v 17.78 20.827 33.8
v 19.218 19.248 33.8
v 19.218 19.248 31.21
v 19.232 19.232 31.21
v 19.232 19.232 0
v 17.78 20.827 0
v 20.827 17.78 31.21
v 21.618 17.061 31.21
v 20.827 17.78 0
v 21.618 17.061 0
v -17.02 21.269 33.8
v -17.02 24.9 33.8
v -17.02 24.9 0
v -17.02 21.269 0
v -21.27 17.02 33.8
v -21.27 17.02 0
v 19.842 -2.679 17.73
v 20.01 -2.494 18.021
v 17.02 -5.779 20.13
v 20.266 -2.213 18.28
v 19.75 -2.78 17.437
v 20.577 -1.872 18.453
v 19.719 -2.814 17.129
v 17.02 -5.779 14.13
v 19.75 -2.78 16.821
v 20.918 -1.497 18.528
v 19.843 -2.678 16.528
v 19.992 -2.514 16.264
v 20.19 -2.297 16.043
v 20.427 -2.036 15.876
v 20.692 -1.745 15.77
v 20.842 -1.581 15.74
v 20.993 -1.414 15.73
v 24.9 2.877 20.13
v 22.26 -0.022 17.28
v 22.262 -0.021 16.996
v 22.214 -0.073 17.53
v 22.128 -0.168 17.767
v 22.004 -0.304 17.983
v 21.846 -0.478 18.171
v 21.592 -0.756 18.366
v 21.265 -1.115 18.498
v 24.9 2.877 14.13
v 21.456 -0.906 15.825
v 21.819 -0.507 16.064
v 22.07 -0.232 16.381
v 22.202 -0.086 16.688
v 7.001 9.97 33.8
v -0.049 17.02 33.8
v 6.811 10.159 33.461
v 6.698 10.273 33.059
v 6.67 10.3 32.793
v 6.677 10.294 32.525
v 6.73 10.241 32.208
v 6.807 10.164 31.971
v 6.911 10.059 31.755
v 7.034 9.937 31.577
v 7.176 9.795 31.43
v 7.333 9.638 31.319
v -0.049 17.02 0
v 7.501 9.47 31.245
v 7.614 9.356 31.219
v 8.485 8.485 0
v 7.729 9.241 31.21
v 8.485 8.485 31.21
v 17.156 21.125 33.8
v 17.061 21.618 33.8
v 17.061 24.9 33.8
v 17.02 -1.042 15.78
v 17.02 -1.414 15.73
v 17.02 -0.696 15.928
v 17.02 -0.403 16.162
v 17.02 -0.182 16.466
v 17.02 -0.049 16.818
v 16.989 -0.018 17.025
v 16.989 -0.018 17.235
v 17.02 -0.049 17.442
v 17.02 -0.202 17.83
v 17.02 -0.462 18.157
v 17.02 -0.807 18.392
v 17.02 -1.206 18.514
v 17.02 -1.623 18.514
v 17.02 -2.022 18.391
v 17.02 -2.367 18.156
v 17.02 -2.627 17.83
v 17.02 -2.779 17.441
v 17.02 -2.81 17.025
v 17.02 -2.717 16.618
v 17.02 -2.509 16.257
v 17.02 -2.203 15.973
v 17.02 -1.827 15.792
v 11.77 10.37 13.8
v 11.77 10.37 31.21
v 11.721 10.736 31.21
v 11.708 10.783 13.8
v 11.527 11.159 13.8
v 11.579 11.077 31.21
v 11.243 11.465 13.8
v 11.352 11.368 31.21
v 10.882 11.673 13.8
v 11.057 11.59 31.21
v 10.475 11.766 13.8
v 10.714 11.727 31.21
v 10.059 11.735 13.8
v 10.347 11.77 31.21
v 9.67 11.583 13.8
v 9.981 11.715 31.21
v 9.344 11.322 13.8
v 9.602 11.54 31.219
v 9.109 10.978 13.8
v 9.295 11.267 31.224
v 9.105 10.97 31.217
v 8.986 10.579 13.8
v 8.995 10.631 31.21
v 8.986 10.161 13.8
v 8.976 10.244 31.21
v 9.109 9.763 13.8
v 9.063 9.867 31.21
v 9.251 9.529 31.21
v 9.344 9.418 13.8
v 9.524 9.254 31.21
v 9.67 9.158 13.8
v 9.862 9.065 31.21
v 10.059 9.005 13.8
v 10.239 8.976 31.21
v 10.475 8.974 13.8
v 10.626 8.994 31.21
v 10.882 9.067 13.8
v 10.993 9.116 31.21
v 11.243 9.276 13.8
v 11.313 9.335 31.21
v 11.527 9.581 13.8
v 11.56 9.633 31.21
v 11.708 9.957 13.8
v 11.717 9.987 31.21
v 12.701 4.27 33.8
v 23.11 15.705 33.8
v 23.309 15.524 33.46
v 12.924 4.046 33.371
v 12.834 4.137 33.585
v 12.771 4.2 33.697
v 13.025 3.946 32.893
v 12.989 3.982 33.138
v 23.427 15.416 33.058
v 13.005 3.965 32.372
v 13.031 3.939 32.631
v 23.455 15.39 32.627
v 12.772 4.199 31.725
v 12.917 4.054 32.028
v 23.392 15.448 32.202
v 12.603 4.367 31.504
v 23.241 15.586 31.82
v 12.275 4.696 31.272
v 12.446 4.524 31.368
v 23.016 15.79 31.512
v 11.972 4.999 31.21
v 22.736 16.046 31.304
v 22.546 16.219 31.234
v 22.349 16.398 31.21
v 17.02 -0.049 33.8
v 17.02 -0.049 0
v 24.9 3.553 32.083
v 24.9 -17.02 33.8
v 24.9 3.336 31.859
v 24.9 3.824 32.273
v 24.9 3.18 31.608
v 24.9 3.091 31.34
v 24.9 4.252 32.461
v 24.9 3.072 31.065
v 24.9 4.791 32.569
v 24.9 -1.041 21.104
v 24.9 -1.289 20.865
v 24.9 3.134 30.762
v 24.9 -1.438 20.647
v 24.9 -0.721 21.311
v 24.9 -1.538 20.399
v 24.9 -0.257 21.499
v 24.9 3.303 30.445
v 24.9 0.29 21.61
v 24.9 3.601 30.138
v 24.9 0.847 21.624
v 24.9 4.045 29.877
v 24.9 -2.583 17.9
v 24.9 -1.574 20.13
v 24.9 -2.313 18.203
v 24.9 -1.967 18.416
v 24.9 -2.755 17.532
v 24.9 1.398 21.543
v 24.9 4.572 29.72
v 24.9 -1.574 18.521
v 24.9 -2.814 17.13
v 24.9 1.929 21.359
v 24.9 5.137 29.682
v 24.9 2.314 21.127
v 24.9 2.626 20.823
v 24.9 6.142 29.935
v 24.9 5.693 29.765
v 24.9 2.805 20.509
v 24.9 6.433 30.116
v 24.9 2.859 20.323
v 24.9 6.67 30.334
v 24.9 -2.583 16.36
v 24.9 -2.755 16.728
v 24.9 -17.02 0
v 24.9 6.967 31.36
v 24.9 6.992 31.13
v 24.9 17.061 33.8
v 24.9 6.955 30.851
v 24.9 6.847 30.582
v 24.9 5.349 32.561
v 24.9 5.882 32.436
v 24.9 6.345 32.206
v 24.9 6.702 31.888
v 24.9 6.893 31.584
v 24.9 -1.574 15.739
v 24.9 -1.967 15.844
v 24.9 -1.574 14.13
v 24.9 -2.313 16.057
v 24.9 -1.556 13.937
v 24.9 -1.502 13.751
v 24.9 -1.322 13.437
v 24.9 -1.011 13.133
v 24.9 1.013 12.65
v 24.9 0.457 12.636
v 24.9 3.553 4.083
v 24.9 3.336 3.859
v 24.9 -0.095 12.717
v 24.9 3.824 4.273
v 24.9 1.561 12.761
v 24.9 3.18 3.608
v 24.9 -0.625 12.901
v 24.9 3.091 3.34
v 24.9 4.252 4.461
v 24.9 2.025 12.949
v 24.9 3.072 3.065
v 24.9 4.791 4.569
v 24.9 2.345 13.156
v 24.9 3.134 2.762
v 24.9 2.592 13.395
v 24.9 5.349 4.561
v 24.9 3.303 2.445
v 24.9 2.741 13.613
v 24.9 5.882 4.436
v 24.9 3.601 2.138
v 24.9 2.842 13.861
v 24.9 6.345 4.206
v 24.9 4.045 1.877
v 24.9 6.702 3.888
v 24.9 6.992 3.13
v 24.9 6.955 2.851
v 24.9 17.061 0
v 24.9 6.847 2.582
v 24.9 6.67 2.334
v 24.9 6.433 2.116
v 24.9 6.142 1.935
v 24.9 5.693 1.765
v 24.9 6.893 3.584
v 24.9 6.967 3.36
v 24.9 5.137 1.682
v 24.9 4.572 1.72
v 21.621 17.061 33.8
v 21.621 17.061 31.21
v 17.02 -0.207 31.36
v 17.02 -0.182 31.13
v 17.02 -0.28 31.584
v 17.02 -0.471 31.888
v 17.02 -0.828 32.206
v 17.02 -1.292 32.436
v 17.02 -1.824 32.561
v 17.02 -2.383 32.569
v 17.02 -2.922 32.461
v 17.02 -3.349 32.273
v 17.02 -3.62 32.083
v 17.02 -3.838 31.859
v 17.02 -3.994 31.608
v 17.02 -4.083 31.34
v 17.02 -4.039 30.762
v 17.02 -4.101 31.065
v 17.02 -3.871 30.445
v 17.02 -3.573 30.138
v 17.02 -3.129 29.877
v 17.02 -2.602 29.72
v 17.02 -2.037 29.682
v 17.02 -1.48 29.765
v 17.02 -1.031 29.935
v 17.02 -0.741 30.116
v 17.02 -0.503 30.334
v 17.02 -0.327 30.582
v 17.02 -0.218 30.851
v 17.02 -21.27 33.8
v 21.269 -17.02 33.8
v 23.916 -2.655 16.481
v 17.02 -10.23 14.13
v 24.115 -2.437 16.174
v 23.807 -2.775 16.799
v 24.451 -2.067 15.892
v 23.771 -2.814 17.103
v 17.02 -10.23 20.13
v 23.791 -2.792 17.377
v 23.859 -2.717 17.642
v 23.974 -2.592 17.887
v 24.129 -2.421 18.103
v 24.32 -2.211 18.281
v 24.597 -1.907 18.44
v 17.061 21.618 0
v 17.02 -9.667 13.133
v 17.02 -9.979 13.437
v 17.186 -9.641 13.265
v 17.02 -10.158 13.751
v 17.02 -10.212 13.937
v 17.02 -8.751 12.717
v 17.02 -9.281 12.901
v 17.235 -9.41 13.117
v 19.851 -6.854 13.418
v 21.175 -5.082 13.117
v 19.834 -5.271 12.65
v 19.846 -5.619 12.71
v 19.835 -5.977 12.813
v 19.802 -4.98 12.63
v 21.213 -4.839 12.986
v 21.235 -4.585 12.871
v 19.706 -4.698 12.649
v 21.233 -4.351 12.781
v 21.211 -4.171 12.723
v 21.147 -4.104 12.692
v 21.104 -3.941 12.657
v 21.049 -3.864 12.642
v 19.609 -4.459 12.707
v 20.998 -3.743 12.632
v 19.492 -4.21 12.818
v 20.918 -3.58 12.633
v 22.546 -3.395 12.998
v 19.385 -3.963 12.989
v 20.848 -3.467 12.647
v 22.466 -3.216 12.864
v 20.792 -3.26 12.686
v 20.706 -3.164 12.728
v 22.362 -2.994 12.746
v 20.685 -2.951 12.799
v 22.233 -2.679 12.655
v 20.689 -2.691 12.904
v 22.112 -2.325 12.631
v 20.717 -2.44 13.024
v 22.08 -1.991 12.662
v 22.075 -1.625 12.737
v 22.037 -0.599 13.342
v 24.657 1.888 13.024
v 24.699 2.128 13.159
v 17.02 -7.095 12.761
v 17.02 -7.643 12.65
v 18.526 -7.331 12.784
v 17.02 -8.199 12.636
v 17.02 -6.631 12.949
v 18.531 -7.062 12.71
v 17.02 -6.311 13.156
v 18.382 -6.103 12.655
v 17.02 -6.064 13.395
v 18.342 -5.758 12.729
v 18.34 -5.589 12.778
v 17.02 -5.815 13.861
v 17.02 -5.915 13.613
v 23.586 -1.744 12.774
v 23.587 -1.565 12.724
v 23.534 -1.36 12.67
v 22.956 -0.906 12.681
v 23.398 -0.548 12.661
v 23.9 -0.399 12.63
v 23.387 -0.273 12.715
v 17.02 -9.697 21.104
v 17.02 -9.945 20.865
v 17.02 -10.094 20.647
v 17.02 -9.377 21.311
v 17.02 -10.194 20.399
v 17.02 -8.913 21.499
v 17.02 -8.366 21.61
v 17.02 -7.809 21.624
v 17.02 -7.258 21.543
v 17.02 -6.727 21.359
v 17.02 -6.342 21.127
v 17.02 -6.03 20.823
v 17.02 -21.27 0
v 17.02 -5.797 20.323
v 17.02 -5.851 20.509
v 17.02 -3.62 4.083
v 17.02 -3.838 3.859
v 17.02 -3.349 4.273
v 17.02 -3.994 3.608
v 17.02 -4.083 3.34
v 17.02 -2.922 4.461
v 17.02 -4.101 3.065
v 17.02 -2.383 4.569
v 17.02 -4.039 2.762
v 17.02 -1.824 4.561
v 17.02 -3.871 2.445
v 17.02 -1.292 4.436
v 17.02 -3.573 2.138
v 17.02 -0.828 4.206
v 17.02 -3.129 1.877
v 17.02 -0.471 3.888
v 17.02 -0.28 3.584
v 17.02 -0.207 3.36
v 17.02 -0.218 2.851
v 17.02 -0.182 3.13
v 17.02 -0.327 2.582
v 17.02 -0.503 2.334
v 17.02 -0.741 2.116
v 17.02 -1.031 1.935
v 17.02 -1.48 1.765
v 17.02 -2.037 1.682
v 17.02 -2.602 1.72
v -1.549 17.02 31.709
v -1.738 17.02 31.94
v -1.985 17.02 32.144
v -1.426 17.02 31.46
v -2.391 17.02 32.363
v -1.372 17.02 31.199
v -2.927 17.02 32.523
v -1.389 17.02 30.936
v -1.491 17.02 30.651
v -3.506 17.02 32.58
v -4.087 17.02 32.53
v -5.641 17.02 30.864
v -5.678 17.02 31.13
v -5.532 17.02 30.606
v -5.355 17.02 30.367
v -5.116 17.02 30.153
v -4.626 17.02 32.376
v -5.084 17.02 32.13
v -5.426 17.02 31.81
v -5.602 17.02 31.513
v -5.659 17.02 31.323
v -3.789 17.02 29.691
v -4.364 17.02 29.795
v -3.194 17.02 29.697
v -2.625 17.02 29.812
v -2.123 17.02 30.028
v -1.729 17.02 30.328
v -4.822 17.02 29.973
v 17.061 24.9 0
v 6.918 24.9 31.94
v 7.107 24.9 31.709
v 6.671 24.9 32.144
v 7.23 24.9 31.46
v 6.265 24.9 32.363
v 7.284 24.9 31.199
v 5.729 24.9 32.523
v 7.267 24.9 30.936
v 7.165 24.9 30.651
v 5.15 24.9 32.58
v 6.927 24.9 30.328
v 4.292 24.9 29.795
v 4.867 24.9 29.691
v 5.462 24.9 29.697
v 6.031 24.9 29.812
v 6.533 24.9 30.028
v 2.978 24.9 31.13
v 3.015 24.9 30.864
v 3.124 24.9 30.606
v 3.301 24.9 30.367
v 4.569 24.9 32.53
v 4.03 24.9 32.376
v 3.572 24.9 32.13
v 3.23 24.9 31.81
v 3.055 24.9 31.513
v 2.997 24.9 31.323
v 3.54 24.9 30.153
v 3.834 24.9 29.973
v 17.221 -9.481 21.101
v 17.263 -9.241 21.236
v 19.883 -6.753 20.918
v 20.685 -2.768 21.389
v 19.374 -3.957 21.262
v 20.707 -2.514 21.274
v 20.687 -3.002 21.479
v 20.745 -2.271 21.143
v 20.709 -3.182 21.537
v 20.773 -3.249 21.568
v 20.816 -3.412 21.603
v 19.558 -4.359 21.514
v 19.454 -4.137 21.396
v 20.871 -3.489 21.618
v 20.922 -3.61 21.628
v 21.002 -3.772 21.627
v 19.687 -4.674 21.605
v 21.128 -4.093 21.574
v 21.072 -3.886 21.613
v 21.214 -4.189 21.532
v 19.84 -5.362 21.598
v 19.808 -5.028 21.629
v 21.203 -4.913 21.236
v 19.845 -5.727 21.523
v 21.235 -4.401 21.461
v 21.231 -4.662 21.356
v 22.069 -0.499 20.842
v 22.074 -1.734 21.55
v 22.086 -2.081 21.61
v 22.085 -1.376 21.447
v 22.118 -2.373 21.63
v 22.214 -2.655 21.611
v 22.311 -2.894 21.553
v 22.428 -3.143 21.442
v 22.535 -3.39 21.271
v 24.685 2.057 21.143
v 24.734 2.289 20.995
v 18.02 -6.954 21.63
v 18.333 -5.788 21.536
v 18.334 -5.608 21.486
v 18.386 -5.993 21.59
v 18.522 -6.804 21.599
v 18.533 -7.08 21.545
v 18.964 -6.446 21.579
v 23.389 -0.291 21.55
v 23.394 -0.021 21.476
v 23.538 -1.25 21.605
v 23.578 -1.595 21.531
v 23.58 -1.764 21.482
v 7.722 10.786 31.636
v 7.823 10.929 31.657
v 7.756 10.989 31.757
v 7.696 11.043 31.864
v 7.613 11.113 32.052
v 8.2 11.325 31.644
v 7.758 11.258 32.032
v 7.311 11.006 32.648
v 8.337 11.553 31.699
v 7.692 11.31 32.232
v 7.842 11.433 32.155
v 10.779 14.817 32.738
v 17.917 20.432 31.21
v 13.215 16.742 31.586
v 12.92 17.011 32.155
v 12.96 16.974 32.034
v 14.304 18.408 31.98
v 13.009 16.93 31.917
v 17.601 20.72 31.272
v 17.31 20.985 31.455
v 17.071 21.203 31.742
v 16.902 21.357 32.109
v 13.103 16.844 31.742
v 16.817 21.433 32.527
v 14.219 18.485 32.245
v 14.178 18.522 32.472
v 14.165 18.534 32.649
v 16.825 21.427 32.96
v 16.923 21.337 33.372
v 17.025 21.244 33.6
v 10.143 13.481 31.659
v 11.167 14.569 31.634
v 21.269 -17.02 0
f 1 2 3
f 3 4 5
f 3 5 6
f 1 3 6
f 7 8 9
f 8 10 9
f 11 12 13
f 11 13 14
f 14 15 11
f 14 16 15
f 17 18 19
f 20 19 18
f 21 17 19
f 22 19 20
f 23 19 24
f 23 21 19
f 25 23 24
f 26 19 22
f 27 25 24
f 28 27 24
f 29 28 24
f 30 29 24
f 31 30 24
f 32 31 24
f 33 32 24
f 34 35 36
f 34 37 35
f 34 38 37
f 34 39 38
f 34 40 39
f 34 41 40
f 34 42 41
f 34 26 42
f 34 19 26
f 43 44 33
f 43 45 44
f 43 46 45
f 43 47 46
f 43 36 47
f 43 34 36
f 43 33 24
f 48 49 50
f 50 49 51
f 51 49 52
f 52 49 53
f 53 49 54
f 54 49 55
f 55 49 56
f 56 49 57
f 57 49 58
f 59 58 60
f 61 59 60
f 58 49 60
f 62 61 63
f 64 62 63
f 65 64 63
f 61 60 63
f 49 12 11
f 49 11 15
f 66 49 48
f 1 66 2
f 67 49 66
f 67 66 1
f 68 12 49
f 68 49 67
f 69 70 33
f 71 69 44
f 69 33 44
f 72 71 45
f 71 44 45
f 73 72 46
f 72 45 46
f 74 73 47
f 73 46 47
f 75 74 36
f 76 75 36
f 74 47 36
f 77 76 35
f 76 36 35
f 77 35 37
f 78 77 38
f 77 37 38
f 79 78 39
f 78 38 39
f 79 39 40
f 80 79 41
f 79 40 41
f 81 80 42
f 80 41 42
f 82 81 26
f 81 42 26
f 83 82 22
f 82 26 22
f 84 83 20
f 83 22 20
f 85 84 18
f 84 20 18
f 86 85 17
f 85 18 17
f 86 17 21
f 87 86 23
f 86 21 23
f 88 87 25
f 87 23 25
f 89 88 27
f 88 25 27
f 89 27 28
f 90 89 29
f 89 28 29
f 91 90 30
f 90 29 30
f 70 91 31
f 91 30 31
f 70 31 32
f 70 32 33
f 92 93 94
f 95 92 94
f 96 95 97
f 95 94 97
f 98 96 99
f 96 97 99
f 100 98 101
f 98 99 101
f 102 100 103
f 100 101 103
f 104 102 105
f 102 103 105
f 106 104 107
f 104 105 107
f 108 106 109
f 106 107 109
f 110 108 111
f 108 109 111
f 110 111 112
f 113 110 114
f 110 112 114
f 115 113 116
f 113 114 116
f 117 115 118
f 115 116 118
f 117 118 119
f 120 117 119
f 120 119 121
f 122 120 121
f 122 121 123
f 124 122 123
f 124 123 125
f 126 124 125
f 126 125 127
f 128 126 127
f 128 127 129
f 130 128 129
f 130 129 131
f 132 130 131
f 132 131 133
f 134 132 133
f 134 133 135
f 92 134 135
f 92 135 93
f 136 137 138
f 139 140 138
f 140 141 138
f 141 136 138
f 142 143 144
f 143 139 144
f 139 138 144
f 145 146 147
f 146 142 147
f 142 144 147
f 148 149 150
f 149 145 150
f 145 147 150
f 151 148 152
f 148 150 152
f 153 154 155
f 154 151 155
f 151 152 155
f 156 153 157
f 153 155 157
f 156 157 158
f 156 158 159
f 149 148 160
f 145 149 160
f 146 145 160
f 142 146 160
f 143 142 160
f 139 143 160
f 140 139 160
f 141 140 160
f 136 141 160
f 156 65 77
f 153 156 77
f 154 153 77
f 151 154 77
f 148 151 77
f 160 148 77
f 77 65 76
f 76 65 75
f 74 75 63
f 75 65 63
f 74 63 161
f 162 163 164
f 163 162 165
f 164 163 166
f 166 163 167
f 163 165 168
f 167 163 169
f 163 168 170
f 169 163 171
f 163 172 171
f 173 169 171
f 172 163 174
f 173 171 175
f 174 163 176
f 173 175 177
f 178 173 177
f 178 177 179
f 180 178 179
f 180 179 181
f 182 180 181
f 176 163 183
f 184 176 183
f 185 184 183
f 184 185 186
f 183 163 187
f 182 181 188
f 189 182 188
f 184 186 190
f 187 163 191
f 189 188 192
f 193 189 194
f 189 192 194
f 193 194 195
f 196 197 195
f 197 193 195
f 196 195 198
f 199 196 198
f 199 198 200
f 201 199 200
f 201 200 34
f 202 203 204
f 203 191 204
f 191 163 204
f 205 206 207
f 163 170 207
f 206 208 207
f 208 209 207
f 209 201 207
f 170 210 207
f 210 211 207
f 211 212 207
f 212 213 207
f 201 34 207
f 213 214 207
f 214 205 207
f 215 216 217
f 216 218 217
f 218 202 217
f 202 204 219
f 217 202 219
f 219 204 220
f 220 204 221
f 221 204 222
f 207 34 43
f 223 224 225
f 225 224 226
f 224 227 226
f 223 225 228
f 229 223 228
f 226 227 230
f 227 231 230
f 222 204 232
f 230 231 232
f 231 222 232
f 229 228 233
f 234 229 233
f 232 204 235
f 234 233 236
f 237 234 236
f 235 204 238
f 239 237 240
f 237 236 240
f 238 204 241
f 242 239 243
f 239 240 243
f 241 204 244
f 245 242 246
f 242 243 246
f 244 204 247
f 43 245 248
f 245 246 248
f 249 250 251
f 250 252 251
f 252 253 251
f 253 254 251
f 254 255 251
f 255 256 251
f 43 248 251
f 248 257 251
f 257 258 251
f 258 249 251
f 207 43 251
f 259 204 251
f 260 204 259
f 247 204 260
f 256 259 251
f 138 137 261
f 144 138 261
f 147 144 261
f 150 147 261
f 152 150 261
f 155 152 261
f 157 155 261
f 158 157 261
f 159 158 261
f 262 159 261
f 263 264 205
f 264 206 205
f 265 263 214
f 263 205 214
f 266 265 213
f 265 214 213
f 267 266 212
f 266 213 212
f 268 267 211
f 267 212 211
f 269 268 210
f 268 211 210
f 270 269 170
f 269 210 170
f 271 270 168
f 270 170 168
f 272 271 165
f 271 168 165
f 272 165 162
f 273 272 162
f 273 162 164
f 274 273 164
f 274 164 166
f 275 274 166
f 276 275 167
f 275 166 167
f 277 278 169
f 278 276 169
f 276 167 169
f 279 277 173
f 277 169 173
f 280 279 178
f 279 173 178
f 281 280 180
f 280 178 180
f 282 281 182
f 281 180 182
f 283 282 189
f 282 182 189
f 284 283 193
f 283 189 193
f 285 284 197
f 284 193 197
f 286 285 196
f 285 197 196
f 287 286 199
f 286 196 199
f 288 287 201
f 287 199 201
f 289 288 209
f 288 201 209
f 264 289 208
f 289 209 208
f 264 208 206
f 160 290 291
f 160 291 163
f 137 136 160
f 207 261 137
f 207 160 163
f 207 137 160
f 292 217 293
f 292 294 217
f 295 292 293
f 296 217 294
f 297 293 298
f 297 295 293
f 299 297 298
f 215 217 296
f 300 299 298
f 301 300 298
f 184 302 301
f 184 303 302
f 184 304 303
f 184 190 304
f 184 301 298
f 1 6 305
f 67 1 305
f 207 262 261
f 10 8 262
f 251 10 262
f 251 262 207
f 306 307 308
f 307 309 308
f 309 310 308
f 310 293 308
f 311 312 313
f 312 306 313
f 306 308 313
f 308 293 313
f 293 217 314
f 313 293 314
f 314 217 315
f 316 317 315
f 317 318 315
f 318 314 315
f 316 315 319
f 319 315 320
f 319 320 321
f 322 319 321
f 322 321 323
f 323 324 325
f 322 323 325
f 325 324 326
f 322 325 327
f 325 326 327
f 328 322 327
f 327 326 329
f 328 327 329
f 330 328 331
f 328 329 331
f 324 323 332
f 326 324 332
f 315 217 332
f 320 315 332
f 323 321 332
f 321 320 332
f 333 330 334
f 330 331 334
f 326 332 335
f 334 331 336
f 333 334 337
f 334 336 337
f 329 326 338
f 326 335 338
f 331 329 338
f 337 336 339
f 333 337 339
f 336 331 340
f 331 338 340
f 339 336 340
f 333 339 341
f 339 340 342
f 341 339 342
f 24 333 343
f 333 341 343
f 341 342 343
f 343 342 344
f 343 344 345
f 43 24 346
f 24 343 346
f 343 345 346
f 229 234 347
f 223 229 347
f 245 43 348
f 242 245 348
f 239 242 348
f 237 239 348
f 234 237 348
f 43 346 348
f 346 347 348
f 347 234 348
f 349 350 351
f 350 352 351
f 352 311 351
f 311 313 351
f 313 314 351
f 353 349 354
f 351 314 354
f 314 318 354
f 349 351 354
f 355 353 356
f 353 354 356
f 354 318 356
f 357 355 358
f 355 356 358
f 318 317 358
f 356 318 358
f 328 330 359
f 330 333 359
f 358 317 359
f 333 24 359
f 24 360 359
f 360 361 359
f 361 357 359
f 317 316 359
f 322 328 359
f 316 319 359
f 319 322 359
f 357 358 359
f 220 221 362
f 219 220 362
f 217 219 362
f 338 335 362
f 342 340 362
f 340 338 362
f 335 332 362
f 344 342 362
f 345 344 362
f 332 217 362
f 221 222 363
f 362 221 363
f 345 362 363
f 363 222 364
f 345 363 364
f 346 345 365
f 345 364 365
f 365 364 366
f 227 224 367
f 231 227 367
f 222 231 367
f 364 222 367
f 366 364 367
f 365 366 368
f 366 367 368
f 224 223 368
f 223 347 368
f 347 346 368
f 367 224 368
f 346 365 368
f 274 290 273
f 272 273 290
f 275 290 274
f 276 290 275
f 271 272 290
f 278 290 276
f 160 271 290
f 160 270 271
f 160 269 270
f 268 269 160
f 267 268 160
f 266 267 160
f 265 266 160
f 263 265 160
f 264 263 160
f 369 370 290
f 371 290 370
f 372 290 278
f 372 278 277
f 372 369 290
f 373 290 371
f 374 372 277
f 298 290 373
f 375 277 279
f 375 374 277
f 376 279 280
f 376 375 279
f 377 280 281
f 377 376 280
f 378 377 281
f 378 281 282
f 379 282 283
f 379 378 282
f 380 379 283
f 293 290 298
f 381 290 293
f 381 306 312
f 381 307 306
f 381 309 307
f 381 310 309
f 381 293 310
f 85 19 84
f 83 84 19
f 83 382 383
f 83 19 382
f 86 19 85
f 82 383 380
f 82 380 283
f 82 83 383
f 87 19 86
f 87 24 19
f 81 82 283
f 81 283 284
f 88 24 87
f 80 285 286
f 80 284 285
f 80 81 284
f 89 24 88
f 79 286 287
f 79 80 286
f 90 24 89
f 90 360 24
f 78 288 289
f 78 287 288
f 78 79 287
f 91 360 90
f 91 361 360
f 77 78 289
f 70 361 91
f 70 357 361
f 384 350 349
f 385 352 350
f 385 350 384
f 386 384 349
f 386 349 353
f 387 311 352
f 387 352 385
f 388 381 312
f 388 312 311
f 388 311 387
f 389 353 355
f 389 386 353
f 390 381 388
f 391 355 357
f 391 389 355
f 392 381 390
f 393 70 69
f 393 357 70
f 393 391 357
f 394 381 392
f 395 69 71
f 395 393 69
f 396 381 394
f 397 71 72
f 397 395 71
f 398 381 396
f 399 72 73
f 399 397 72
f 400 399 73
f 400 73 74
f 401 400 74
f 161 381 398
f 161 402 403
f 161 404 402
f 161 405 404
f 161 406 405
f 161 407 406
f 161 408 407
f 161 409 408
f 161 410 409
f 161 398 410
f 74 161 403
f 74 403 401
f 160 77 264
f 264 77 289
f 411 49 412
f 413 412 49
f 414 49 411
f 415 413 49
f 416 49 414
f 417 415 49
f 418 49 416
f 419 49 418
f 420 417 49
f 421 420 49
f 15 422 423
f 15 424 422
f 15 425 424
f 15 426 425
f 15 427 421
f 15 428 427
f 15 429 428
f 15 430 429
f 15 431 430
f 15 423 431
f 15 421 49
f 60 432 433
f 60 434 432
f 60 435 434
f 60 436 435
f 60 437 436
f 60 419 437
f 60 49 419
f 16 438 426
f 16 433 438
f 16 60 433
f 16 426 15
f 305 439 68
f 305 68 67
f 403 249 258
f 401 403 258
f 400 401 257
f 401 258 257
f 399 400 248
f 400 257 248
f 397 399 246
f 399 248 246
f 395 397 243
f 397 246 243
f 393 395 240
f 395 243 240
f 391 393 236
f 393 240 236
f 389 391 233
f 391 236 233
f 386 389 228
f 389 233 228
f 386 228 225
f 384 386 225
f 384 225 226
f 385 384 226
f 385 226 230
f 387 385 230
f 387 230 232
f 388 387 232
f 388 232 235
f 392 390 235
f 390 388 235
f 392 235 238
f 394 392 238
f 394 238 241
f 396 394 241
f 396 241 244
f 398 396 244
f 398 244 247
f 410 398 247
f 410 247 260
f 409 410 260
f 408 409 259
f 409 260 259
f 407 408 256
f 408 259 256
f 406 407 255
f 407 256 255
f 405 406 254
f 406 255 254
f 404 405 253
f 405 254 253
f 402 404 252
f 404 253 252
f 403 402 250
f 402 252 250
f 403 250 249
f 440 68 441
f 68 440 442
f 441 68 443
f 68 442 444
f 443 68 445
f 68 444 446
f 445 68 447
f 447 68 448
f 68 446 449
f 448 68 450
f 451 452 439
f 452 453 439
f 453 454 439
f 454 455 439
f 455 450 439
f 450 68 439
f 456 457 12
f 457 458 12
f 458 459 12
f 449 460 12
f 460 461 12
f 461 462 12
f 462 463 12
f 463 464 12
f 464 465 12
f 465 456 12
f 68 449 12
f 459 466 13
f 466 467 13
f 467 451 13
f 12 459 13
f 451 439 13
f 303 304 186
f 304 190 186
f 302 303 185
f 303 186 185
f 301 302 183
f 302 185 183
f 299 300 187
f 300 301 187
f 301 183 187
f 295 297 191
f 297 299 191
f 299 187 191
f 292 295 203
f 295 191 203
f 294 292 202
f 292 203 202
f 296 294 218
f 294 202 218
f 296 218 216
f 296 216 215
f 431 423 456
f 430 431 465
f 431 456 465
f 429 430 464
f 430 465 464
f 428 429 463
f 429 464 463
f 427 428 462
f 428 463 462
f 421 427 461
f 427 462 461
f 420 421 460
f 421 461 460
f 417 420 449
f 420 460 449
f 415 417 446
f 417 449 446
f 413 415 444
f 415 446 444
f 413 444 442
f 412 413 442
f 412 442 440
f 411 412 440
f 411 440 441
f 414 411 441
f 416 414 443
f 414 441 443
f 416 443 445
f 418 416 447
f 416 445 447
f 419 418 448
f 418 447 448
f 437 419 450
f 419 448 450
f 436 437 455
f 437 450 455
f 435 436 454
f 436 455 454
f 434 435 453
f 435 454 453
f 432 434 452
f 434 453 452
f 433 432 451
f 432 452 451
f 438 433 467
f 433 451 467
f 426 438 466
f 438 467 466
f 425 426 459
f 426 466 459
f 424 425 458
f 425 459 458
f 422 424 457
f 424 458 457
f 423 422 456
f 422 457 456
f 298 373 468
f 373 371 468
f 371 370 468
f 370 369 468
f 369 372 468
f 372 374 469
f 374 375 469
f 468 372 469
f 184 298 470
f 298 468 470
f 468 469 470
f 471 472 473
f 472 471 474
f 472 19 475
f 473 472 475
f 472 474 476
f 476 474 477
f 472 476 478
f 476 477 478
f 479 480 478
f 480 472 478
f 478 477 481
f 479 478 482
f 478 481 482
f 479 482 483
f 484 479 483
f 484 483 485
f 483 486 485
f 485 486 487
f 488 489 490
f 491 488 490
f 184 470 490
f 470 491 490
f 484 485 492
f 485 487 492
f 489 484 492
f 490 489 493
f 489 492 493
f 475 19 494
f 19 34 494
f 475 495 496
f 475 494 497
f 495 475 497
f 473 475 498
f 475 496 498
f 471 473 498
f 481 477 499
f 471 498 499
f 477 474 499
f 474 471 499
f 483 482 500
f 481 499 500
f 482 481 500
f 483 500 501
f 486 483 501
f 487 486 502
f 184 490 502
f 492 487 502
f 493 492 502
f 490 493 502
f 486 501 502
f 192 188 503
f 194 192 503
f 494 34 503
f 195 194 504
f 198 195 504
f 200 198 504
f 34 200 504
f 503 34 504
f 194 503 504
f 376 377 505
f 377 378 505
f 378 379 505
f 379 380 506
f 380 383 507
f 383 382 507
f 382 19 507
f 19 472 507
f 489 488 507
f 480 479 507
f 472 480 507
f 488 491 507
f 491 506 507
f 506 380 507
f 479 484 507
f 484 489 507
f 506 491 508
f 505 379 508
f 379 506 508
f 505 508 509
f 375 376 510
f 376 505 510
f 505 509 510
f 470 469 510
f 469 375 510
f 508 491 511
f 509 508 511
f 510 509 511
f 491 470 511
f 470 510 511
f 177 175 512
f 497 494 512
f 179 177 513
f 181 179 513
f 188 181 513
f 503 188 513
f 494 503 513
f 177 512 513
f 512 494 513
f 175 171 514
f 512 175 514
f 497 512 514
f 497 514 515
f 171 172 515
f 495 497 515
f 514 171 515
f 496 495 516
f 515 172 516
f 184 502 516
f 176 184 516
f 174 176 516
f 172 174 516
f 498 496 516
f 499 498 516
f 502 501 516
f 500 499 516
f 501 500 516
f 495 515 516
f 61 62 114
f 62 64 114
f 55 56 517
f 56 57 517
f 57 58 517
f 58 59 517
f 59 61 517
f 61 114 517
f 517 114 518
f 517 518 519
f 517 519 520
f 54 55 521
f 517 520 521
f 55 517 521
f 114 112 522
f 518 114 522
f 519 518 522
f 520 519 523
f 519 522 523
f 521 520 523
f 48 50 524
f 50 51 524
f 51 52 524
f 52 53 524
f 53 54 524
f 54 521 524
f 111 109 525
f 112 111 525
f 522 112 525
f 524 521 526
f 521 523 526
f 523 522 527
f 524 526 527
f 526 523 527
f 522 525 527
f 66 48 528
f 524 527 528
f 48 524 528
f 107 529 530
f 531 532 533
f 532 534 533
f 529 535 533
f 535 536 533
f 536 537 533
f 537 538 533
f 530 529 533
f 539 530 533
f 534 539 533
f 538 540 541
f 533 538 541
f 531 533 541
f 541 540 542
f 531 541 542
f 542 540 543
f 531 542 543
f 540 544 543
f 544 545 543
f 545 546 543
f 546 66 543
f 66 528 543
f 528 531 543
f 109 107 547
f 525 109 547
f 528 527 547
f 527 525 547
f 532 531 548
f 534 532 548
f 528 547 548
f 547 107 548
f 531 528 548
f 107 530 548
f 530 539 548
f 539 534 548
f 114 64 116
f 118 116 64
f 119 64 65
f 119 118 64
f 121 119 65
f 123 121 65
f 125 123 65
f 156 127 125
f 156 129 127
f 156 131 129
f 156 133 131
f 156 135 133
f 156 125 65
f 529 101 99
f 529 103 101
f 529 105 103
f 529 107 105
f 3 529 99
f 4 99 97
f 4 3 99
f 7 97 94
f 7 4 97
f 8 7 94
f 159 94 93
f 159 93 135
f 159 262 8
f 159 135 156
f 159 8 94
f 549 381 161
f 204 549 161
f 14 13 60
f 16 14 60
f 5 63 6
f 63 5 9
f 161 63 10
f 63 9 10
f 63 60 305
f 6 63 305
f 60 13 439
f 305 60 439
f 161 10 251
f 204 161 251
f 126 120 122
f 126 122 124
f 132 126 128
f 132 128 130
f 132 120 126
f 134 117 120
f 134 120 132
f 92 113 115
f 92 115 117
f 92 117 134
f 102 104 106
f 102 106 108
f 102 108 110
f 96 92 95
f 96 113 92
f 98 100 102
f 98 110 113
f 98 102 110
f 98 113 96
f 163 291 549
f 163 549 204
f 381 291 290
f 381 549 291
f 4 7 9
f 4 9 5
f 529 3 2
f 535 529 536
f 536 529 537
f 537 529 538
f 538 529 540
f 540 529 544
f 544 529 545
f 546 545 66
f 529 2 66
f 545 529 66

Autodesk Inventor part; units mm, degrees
ref_plane "YZ Plane" through (0, 0, 0) normal (1, 0, 0) x (0, 1, 0)
ref_plane "XZ Plane" through (0, 0, 0) normal (0, 1, 0) x (-1, 0, 0)
ref_plane "XY Plane" through (0, 0, 0) normal (0, 0, 1) x (1, 0, 0)
ref_plane "Arbeitsebene1" through (0, 0, 0) normal (0, 0, 1) x (1, 0, 0)
sketch "Skizze1" plane through (0, 0, 0) normal (0, 0, 1) x (1, 0, 0)
  arc A0 (24.9, 22.9) -> (22.9, 24.9) centre (22.9, 22.9) ccw projected
  line L0 (22.9, 24.9) -> (-17.02, 24.9) projected
  line L1 (-17.02, 24.9) -> (-17.02, 21.2686) projected
  line L2 (-17.02, 21.2) -> (17.02, 21.2) projected
  line L3 (-21.2698, 17.02) -> (-17.02, 17.02) projected
  line L4 (21.2698, 17.02) -> (21.2698, -17.02) projected
  line L5 (21.2698, -17.02) -> (17.02, -17.02) projected
  line L6 (24.9, -17.02) -> (24.9, 22.9) projected
  line L7 (23.75, 23.25) -> (23.75, 18.15) projected
  arc A1 (23.25, 17.65) -> (23.75, 18.15) centre (23.25, 18.15) ccw projected
  line L8 (23.25, 17.65) -> (20.8937, 17.65) projected
  arc A2 (20.5239, 17.8134) -> (20.8937, 17.65) centre (20.8937, 18.15) ccw projected
  line L9 (20.5239, 17.8134) -> (17.7803, 20.8273) projected
  arc A3 (17.65, 21.1639) -> (17.7803, 20.8273) centre (18.15, 21.1639) ccw projected
  line L10 (17.65, 21.1639) -> (17.65, 23.25) projected
  arc A4 (18.15, 23.75) -> (17.65, 23.25) centre (18.15, 23.25) ccw projected
  line L11 (18.15, 23.75) -> (23.25, 23.75) projected
  arc A5 (23.75, 23.25) -> (23.25, 23.75) centre (23.25, 23.25) ccw projected
  line L12 (-17.02, 24.9) -> (17.0606, 24.9)
  line L13 (17.0606, 24.9) -> (17.0606, 21.9)
  line L14 (17.0606, 21.9) -> (-17.02, 21.9)
  line L15 (34.79, 34.79) -> (-34.79, -34.79)
  line L16 (17.0606, 21.9) -> (17.0606, 17.0606)
  line L17 (13.0606, 21.9) -> (13.0606, 13.0606)
  line L18 (17.0606, 17.0606) -> (13.0606, 13.0606)
  line L19 (17.02, 17.02) -> (-17.02, 17.02) projected
  line L20 (17.02, 21.2) -> (17.02, 17.02) projected
  line L21 (-17.02, 21.2) -> (17.02, 21.2) projected
  line L22 (-17.02, 24.9) -> (-17.02, 21.2686) projected
  line L23 (-21.2711, 17.02) -> (-17.02, 21.2686) projected
  line L24 (17.02, 17.02) -> (21.2698, 17.02) projected
  line L25 (-17.02, 21.9) -> (-13.02, 21.9)
  line L26 (-13.02, 21.9) -> (-13.02, 17.02)
  line L27 (-13.02, 17.02) -> (-17.02, 17.02)
  line L28 (-17.02, 17.02) -> (-17.02, 21.9)
  line L29 (-17.02, 21.2686) -> (-21.2711, 17.02)
  line L30 (-21.2711, 17.02) -> (-17.02, 17.02)
  line L31 (-4.9294, 21.9) -> (21.2698, -4.2993)
  line L32 (21.2698, 2.7718) -> (2.1416, 21.9)
  line L33 (12.0208, 12.0208) -> (8.4853, 8.4853)
  line L34 (-17.02, 17.02) -> (-17.02, 21.2) projected
  line L35 (-17.02, -21.2) -> (-17.02, -17.02) projected
  line L36 (-21.2698, -17.02) -> (-21.2698, 17.02) projected
  line L37 (-17.02, 17.02) -> (-17.02, 21.2) projected
  line L38 (17.02, 21.2) -> (17.02, 17.02) projected
  line L39 (17.02, 17.02) -> (21.2698, 17.02) projected
  line L40 (17.02, -17.02) -> (17.02, -21.2) projected
  line L41 (17.02, -21.2) -> (-17.02, -21.2) projected
  line L42 (-20.8273, -17.7803) -> (-17.8134, -20.5239) projected
  arc A6 (-17.65, -20.8937) -> (-17.8134, -20.5239) centre (-18.15, -20.8937) ccw projected
  line L43 (-17.65, -20.8937) -> (-17.65, -23.25) projected
  arc A7 (-18.15, -23.75) -> (-17.65, -23.25) centre (-18.15, -23.25) ccw projected
  line L44 (-18.15, -23.75) -> (-23.25, -23.75) projected
  arc A8 (-23.75, -23.25) -> (-23.25, -23.75) centre (-23.25, -23.25) ccw projected
  line L45 (-23.75, -23.25) -> (-23.75, -18.15) projected
  arc A9 (-23.25, -17.65) -> (-23.75, -18.15) centre (-23.25, -18.15) ccw projected
  line L46 (-23.25, -17.65) -> (-21.1639, -17.65) projected
  arc A10 (-20.8273, -17.7803) -> (-21.1639, -17.65) centre (-21.1639, -18.15) ccw projected
  line L47 (-21.2711, 17.02) -> (-17.02, 21.2686) projected
  line L48 (-21.2711, 17.02) -> (-24.9, 17.02) projected
  line L49 (-24.9, 17.02) -> (-24.9, -22.9) projected
  arc A11 (-24.9, -22.9) -> (-22.9, -24.9) centre (-22.9, -22.9) ccw projected
  line L50 (-22.9, -24.9) -> (17.02, -24.9) projected
  line L51 (17.02, -24.9) -> (17.02, -21.2686) projected
  line L52 (21.2711, -17.02) -> (17.02, -21.2686) projected
  line L53 (21.2711, -17.02) -> (24.9, -17.02) projected
  line L54 (-17.02, -21.2) -> (-17.02, -17.02) projected
  line L55 (-17.02, -17.02) -> (-21.2698, -17.02) projected
  line L56 (-21.2698, -17.02) -> (-21.2698, 17.02) projected
  line L57 (-17.02, 17.02) -> (-17.02, 21.2) projected
  line L58 (-17.02, 21.2) -> (17.02, 21.2) projected
  line L59 (17.02, 21.2) -> (17.02, 17.02) projected
  line L60 (21.2698, 17.02) -> (21.2698, -17.02) projected
  line L61 (21.2698, -17.02) -> (17.02, -17.02) projected
  line L62 (17.02, -17.02) -> (17.02, -21.2) projected
  line L63 (17.02, -21.2) -> (-17.02, -21.2) projected
  line L64 (-20.8273, -17.7803) -> (-17.8134, -20.5239) projected
  arc A12 (-17.65, -20.8937) -> (-17.8134, -20.5239) centre (-18.15, -20.8937) ccw projected
  line L65 (-17.65, -20.8937) -> (-17.65, -23.25) projected
  arc A13 (-18.15, -23.75) -> (-17.65, -23.25) centre (-18.15, -23.25) ccw projected
  line L66 (-18.15, -23.75) -> (-23.25, -23.75) projected
  arc A14 (-23.75, -23.25) -> (-23.25, -23.75) centre (-23.25, -23.25) ccw projected
  line L67 (-23.75, -23.25) -> (-23.75, -18.15) projected
  arc A15 (-23.25, -17.65) -> (-23.75, -18.15) centre (-23.25, -18.15) ccw projected
  line L68 (-23.25, -17.65) -> (-21.1639, -17.65) projected
  arc A16 (-20.8273, -17.7803) -> (-21.1639, -17.65) centre (-21.1639, -18.15) ccw projected
  line L69 (23.75, 23.25) -> (23.75, 18.15) projected
  arc A17 (23.25, 17.65) -> (23.75, 18.15) centre (23.25, 18.15) ccw projected
  line L70 (23.25, 17.65) -> (20.8937, 17.65) projected
  arc A18 (20.5239, 17.8134) -> (20.8937, 17.65) centre (20.8937, 18.15) ccw projected
  line L71 (20.5239, 17.8134) -> (17.7803, 20.8273) projected
  arc A19 (17.65, 21.1639) -> (17.7803, 20.8273) centre (18.15, 21.1639) ccw projected
  line L72 (17.65, 21.1639) -> (17.65, 23.25) projected
  arc A20 (18.15, 23.75) -> (17.65, 23.25) centre (18.15, 23.25) ccw projected
  line L73 (18.15, 23.75) -> (23.25, 23.75) projected
  arc A21 (23.75, 23.25) -> (23.25, 23.75) centre (23.25, 23.25) ccw projected
  arc A22 (24.9, 22.9) -> (22.9, 24.9) centre (22.9, 22.9) ccw projected
  line L74 (22.9, 24.9) -> (-17.02, 24.9) projected
  line L75 (-21.2711, 17.02) -> (-24.9, 17.02) projected
  line L76 (-24.9, 17.02) -> (-24.9, -22.9) projected
  arc A23 (-24.9, -22.9) -> (-22.9, -24.9) centre (-22.9, -22.9) ccw projected
  line L77 (-22.9, -24.9) -> (17.02, -24.9) projected
  line L78 (17.02, -24.9) -> (17.02, -21.2686) projected
  line L79 (21.2711, -17.02) -> (17.02, -21.2686) projected
  line L80 (21.2711, -17.02) -> (24.9, -17.02) projected
  line L81 (24.9, -17.02) -> (24.9, 22.9) projected
  line L82 (19.2323, 19.2323) -> (17.0606, 21.6178)
  line L83 (-17.02, -17.02) -> (-21.2698, -17.02) projected
  line L84 (-21.2698, 17.02) -> (-17.02, 17.02) projected
  point P0 (0, 0)
  point P1 (17.0606, 24.9)
  point P2 (-16.97, 16.97)
  point P3 (-13.02, 17.02)
  point P4 (-13.02, 21.2)
  point P5 (13.0606, 21.2)
  point P6 (2.8416, 21.2)
  point P7 (-4.2294, 21.2)
  point P8 (13.0606, 17.02)
  point P9 (16.97, 21.2)
  point P10 (-16.97, 17.02)
  point P11 (-17.02, 20.7)
  point P12 (13.0606, 21.2)
  point P13 (-16.97, 21.2)
  point P14 (-17.02, 21.9)
  point P15 (19.2323, 19.2323)
  point P16 (23.6036, 23.6036)
  point P17 (24.3142, 24.3142)
  point P18 (16.97, 17.02)
  point P19 (7.0216, 17.02)
  point P20 (-0.0494, 17.02)
  point P21 (-17.02, 17.02)
  dimension "d3" = 4
  dimension "d6" = 4
  dimension "d9" = 0
  dimension "d11" = 5
  dimension "d35" = 0
extrude "Extrusion1" add sketch "Skizze1" along normal blind 33.8 contours L13 L14 L1 L0 | L15 L16 L82 L9 | L16 L15 L20 L2 L17 L14 | L31 L19 L32 L15 | L14 L26 L2 L28 L1 | L17 L2 L32 L14 | L15 L17 L19 | L19 L17 L2 L20 | L32 L19 L17 L15 | L31 L2 L32 L19 | L19 L26 L2 L31 | L28 L3 L23 | L14 L31 L2 L26 | L32 L2 L31 L14 | L17 L19 L32 L2 | L19 L28 L2 L26
mirror "Spiegeln1" about plane through (8.4853, 8.4853, 0) normal (0.7071, -0.7071, 0) of "Extrusion1"
sketch "Skizze2" plane through (17.6463, 20.9745, 0) normal (0.7395, 0.6732, 0) x (-0.6732, 0.7395, 0)
  circle A0 centre (-16.6729, 31.13) radius 1.45
  circle A1 centre (-16.6729, 3.13) radius 1.45
  circle A2 centre (11.3271, 31.13) radius 1.45
  point P0 (-3.6312, 0)
  dimension "d36" = 2.9
  dimension "d37" = 2.9
  dimension "d38" = 2.9
sketch "Skizze3" plane through (17.2397, 21.0462, 0) normal (0.6732, 0.7395, 0) x (-0.7395, 0.6732, 0)
  line L0 (-17.8955, 20.13) -> (-17.8955, 14.13) projected
  line L1 (-20.8922, 14.13) -> (-20.8922, 20.13) projected
  line L2 (-0.9142, 31.21) -> (-6.9076, 31.21) projected
  line L3 (-6.9076, 34.21) -> (-0.9142, 34.21) projected
  line L4 (13.0291, 42.03) -> (-20.8922, 42.03) projected
  line L5 (-20.8922, 42.03) -> (-20.8922, 38.4552) projected
  line L6 (-20.8922, 38.4552) -> (-25.2126, 34.13) projected
  line L7 (-25.2126, 34.13) -> (-28.7835, 34.13) projected
  line L8 (-28.7835, 34.13) -> (-28.7835, 0.13) projected
  line L9 (-28.7835, 0.13) -> (-25.2126, 0.13) projected
  line L10 (-25.2126, 0.13) -> (-20.8922, -4.1952) projected
  line L11 (-20.8922, -4.1952) -> (-20.8922, -7.77) projected
  line L12 (-20.8922, -7.77) -> (13.0704, -7.77) projected
  line L13 (13.0704, -7.77) -> (13.0704, -4.1952) projected
  line L14 (13.0704, -4.1952) -> (17.3909, 0.13) projected
  line L15 (17.3909, 0.13) -> (20.9618, 0.13) projected
  line L16 (20.9618, 0.13) -> (20.9618, 34.13) projected
  line L17 (20.9618, 34.13) -> (17.3909, 34.13) projected
  line L18 (17.3909, 34.13) -> (13.0291, 38.4966) projected
  line L19 (13.0291, 38.4966) -> (13.0291, 42.03) projected
  ellipse E0 centre (-19.3938, 14.13) end of major axis (-19.3938, 15.63) minor radius 1.4984 (-20.8922, 14.13) -> (-17.8955, 14.13) ccw projected
  ellipse E1 centre (-19.3938, 20.13) end of major axis (-19.3938, 18.63) minor radius 1.4984 (-17.8955, 20.13) -> (-20.8922, 20.13) ccw projected
  ellipse E2 centre (-6.9076, 32.71) end of major axis (-6.9076, 34.21) minor radius 1.4984 (-6.9076, 34.21) -> (-6.9076, 31.21) ccw projected
  ellipse E3 centre (-0.9142, 32.71) end of major axis (-0.9142, 31.21) minor radius 1.4984 (-0.9142, 31.21) -> (-0.9142, 34.21) ccw projected
  ellipse E4 centre (-17.8955, 31.13) end of major axis (-17.8955, 34.38) minor radius 3.2464 projected
  ellipse E5 centre (-3.9109, 17.13) end of major axis (-3.9109, 20.38) minor radius 3.2464 projected
  ellipse E6 centre (10.0737, 31.13) end of major axis (10.0737, 34.38) minor radius 3.2464 projected
  ellipse E7 centre (-17.8955, 3.13) end of major axis (-17.8955, 6.38) minor radius 3.2464 projected
  point P0 (-1.4194, 0)
extrude "Extrusion2" cut sketch "Skizze3" against normal blind 33.8 contours L0 E0 L1 E1 | L2 E2 L3 E3
sketch "Skizze4" plane through (0, 0, 33.8) normal (0, 0, 1) x (1, 0, 0)
  line L0 (22.3477, 16.3962) -> (11.972, 4.9986) projected
  line L1 (17.9157, 20.4308) -> (7.7294, 9.2412) projected
  circle A0 centre (10.3701, 10.3701) radius 1.4
  line L2 (19.2323, 19.2323) -> (21.6178, 17.0606) projected
  line L3 (19.2323, 19.2323) -> (17.9157, 20.4308) projected
  line L4 (11.972, 4.9986) -> (7.7294, 9.2412) projected
  line L5 (22.3477, 16.3962) -> (21.6178, 17.0606) projected
  point P0 (0, 0)
  dimension "d26" = 2.8
extrude "Extrusion3" cut sketch "Skizze4" against normal blind 20 contours A0 L1 | L1 A0
sketch "Skizze5" plane through (24.9, -16.97, 33.8) normal (1, 0, 0) x (0, 0, -1)
  line L0 (0, 34.0306) -> (0, -0.05) projected
  line L1 (33.8, 34.0306) -> (33.8, -0.05) projected
  line L2 (19.67, 15.5558) -> (13.67, 15.5558) projected
  circle A0 centre (16.67, 15.5558) radius 1.4
  line L3 (33.8, -0.05) -> (0, -0.05) projected
  line L4 (33.8, 34.0306) -> (0, 34.0306) projected
  point P0 (33.8, 16.97)
  dimension "d29" = 2.8
extrude "Extrusion4" cut sketch "Skizze5" against normal blind 20 contours A0 L2 | L2 A0
extrude "Extrusion6" cut sketch "Skizze2" against normal through all
properties part number "20_Cube_Insert_Kinematic_Mirror_45_pro_v3"
